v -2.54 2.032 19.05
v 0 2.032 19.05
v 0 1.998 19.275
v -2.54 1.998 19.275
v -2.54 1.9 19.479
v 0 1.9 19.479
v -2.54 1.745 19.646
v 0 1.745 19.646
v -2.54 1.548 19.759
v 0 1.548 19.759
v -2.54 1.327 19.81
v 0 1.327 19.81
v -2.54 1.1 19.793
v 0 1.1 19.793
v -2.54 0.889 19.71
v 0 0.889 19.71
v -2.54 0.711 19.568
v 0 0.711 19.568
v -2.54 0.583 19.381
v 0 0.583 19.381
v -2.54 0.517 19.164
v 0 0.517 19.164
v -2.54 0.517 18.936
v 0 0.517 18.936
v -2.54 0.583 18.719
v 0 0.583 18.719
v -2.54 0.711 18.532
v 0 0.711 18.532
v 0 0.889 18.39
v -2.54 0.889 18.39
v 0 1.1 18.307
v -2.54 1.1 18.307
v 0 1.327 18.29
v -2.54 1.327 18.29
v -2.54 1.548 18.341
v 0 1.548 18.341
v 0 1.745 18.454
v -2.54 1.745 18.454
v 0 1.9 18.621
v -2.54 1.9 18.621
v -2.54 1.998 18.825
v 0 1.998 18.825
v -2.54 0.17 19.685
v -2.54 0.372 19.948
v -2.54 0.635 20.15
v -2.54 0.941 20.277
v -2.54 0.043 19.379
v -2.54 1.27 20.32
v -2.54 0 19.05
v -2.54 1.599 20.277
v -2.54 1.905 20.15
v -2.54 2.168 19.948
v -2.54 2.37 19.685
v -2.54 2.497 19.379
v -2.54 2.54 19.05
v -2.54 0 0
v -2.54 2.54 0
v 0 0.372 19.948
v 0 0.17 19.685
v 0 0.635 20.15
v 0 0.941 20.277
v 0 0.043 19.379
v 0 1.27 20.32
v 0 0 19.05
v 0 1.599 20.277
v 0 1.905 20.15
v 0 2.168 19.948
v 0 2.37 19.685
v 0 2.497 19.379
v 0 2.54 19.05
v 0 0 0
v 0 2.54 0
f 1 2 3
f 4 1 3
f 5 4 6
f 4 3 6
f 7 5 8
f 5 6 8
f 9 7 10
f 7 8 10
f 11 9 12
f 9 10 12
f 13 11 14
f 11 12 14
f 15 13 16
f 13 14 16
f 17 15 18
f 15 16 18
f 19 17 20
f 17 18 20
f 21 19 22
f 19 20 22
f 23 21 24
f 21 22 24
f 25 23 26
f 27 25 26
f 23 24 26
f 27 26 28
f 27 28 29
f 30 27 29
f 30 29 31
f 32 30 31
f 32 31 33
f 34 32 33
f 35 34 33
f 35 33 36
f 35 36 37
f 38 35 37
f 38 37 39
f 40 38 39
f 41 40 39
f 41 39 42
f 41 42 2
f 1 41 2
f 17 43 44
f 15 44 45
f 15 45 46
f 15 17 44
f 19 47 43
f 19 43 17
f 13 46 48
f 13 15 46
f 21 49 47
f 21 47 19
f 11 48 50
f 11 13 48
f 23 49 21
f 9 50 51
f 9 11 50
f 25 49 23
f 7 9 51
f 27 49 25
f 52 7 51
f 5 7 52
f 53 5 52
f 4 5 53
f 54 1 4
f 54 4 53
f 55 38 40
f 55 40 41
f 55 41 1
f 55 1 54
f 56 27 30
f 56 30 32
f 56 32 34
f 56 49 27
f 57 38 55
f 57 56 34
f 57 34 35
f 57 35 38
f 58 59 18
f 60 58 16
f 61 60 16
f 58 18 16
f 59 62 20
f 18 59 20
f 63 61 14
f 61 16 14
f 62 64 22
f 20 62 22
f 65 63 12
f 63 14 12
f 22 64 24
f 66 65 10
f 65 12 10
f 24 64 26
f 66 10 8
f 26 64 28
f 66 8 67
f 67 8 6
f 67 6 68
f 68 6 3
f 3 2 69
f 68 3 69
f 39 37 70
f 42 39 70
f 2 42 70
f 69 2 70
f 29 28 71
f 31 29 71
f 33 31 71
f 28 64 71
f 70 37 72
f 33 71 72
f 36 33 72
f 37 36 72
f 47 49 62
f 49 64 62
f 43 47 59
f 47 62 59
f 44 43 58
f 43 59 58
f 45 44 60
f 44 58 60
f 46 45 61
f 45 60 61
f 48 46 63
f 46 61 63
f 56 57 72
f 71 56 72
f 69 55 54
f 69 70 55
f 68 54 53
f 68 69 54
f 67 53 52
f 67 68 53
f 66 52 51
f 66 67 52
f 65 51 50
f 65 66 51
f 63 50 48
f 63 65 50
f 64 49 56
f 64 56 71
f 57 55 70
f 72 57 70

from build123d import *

# Parameters (mm, degrees)
SKETCH1_W           = 2.54
SKETCH1_H           = 2.54
BOSS_EXTRUDE1_DEPTH = 20.32
FILLET1_R           = 1.27
SKETCH2_R           = 0.762
CUT_EXTRUDE1_DEPTH  = 21.635057548


with BuildPart() as part:
    # Sketch1 → Boss-Extrude1 (new body)
    with BuildSketch(Plane.XY):
        with Locations((-1.27, 1.27)):
            Rectangle(SKETCH1_W, SKETCH1_H)
    extrude(amount=BOSS_EXTRUDE1_DEPTH)

    # Fillet1
    fillet1_edges = [part.edges().sort_by_distance(p)[0] for p in [
        (-1.27, 0, 20.32),
        (-1.27, 2.54, 20.32),
    ]]
    fillet(fillet1_edges, radius=FILLET1_R - 0.0001)  # a hair under: the kernel refuses the full size

    # Sketch2 → Cut-Extrude1 (cut, through all)
    with BuildSketch(Plane(origin=(0, 0, 0), x_dir=(0, 0, -1), z_dir=(1, 0, 0))):
        with Locations(Location((-19.05, 1.27, 0), (0, 0, 90))):
            Circle(SKETCH2_R)
    extrude(amount=-CUT_EXTRUDE1_DEPTH, mode=Mode.SUBTRACT)


solid = part.part
